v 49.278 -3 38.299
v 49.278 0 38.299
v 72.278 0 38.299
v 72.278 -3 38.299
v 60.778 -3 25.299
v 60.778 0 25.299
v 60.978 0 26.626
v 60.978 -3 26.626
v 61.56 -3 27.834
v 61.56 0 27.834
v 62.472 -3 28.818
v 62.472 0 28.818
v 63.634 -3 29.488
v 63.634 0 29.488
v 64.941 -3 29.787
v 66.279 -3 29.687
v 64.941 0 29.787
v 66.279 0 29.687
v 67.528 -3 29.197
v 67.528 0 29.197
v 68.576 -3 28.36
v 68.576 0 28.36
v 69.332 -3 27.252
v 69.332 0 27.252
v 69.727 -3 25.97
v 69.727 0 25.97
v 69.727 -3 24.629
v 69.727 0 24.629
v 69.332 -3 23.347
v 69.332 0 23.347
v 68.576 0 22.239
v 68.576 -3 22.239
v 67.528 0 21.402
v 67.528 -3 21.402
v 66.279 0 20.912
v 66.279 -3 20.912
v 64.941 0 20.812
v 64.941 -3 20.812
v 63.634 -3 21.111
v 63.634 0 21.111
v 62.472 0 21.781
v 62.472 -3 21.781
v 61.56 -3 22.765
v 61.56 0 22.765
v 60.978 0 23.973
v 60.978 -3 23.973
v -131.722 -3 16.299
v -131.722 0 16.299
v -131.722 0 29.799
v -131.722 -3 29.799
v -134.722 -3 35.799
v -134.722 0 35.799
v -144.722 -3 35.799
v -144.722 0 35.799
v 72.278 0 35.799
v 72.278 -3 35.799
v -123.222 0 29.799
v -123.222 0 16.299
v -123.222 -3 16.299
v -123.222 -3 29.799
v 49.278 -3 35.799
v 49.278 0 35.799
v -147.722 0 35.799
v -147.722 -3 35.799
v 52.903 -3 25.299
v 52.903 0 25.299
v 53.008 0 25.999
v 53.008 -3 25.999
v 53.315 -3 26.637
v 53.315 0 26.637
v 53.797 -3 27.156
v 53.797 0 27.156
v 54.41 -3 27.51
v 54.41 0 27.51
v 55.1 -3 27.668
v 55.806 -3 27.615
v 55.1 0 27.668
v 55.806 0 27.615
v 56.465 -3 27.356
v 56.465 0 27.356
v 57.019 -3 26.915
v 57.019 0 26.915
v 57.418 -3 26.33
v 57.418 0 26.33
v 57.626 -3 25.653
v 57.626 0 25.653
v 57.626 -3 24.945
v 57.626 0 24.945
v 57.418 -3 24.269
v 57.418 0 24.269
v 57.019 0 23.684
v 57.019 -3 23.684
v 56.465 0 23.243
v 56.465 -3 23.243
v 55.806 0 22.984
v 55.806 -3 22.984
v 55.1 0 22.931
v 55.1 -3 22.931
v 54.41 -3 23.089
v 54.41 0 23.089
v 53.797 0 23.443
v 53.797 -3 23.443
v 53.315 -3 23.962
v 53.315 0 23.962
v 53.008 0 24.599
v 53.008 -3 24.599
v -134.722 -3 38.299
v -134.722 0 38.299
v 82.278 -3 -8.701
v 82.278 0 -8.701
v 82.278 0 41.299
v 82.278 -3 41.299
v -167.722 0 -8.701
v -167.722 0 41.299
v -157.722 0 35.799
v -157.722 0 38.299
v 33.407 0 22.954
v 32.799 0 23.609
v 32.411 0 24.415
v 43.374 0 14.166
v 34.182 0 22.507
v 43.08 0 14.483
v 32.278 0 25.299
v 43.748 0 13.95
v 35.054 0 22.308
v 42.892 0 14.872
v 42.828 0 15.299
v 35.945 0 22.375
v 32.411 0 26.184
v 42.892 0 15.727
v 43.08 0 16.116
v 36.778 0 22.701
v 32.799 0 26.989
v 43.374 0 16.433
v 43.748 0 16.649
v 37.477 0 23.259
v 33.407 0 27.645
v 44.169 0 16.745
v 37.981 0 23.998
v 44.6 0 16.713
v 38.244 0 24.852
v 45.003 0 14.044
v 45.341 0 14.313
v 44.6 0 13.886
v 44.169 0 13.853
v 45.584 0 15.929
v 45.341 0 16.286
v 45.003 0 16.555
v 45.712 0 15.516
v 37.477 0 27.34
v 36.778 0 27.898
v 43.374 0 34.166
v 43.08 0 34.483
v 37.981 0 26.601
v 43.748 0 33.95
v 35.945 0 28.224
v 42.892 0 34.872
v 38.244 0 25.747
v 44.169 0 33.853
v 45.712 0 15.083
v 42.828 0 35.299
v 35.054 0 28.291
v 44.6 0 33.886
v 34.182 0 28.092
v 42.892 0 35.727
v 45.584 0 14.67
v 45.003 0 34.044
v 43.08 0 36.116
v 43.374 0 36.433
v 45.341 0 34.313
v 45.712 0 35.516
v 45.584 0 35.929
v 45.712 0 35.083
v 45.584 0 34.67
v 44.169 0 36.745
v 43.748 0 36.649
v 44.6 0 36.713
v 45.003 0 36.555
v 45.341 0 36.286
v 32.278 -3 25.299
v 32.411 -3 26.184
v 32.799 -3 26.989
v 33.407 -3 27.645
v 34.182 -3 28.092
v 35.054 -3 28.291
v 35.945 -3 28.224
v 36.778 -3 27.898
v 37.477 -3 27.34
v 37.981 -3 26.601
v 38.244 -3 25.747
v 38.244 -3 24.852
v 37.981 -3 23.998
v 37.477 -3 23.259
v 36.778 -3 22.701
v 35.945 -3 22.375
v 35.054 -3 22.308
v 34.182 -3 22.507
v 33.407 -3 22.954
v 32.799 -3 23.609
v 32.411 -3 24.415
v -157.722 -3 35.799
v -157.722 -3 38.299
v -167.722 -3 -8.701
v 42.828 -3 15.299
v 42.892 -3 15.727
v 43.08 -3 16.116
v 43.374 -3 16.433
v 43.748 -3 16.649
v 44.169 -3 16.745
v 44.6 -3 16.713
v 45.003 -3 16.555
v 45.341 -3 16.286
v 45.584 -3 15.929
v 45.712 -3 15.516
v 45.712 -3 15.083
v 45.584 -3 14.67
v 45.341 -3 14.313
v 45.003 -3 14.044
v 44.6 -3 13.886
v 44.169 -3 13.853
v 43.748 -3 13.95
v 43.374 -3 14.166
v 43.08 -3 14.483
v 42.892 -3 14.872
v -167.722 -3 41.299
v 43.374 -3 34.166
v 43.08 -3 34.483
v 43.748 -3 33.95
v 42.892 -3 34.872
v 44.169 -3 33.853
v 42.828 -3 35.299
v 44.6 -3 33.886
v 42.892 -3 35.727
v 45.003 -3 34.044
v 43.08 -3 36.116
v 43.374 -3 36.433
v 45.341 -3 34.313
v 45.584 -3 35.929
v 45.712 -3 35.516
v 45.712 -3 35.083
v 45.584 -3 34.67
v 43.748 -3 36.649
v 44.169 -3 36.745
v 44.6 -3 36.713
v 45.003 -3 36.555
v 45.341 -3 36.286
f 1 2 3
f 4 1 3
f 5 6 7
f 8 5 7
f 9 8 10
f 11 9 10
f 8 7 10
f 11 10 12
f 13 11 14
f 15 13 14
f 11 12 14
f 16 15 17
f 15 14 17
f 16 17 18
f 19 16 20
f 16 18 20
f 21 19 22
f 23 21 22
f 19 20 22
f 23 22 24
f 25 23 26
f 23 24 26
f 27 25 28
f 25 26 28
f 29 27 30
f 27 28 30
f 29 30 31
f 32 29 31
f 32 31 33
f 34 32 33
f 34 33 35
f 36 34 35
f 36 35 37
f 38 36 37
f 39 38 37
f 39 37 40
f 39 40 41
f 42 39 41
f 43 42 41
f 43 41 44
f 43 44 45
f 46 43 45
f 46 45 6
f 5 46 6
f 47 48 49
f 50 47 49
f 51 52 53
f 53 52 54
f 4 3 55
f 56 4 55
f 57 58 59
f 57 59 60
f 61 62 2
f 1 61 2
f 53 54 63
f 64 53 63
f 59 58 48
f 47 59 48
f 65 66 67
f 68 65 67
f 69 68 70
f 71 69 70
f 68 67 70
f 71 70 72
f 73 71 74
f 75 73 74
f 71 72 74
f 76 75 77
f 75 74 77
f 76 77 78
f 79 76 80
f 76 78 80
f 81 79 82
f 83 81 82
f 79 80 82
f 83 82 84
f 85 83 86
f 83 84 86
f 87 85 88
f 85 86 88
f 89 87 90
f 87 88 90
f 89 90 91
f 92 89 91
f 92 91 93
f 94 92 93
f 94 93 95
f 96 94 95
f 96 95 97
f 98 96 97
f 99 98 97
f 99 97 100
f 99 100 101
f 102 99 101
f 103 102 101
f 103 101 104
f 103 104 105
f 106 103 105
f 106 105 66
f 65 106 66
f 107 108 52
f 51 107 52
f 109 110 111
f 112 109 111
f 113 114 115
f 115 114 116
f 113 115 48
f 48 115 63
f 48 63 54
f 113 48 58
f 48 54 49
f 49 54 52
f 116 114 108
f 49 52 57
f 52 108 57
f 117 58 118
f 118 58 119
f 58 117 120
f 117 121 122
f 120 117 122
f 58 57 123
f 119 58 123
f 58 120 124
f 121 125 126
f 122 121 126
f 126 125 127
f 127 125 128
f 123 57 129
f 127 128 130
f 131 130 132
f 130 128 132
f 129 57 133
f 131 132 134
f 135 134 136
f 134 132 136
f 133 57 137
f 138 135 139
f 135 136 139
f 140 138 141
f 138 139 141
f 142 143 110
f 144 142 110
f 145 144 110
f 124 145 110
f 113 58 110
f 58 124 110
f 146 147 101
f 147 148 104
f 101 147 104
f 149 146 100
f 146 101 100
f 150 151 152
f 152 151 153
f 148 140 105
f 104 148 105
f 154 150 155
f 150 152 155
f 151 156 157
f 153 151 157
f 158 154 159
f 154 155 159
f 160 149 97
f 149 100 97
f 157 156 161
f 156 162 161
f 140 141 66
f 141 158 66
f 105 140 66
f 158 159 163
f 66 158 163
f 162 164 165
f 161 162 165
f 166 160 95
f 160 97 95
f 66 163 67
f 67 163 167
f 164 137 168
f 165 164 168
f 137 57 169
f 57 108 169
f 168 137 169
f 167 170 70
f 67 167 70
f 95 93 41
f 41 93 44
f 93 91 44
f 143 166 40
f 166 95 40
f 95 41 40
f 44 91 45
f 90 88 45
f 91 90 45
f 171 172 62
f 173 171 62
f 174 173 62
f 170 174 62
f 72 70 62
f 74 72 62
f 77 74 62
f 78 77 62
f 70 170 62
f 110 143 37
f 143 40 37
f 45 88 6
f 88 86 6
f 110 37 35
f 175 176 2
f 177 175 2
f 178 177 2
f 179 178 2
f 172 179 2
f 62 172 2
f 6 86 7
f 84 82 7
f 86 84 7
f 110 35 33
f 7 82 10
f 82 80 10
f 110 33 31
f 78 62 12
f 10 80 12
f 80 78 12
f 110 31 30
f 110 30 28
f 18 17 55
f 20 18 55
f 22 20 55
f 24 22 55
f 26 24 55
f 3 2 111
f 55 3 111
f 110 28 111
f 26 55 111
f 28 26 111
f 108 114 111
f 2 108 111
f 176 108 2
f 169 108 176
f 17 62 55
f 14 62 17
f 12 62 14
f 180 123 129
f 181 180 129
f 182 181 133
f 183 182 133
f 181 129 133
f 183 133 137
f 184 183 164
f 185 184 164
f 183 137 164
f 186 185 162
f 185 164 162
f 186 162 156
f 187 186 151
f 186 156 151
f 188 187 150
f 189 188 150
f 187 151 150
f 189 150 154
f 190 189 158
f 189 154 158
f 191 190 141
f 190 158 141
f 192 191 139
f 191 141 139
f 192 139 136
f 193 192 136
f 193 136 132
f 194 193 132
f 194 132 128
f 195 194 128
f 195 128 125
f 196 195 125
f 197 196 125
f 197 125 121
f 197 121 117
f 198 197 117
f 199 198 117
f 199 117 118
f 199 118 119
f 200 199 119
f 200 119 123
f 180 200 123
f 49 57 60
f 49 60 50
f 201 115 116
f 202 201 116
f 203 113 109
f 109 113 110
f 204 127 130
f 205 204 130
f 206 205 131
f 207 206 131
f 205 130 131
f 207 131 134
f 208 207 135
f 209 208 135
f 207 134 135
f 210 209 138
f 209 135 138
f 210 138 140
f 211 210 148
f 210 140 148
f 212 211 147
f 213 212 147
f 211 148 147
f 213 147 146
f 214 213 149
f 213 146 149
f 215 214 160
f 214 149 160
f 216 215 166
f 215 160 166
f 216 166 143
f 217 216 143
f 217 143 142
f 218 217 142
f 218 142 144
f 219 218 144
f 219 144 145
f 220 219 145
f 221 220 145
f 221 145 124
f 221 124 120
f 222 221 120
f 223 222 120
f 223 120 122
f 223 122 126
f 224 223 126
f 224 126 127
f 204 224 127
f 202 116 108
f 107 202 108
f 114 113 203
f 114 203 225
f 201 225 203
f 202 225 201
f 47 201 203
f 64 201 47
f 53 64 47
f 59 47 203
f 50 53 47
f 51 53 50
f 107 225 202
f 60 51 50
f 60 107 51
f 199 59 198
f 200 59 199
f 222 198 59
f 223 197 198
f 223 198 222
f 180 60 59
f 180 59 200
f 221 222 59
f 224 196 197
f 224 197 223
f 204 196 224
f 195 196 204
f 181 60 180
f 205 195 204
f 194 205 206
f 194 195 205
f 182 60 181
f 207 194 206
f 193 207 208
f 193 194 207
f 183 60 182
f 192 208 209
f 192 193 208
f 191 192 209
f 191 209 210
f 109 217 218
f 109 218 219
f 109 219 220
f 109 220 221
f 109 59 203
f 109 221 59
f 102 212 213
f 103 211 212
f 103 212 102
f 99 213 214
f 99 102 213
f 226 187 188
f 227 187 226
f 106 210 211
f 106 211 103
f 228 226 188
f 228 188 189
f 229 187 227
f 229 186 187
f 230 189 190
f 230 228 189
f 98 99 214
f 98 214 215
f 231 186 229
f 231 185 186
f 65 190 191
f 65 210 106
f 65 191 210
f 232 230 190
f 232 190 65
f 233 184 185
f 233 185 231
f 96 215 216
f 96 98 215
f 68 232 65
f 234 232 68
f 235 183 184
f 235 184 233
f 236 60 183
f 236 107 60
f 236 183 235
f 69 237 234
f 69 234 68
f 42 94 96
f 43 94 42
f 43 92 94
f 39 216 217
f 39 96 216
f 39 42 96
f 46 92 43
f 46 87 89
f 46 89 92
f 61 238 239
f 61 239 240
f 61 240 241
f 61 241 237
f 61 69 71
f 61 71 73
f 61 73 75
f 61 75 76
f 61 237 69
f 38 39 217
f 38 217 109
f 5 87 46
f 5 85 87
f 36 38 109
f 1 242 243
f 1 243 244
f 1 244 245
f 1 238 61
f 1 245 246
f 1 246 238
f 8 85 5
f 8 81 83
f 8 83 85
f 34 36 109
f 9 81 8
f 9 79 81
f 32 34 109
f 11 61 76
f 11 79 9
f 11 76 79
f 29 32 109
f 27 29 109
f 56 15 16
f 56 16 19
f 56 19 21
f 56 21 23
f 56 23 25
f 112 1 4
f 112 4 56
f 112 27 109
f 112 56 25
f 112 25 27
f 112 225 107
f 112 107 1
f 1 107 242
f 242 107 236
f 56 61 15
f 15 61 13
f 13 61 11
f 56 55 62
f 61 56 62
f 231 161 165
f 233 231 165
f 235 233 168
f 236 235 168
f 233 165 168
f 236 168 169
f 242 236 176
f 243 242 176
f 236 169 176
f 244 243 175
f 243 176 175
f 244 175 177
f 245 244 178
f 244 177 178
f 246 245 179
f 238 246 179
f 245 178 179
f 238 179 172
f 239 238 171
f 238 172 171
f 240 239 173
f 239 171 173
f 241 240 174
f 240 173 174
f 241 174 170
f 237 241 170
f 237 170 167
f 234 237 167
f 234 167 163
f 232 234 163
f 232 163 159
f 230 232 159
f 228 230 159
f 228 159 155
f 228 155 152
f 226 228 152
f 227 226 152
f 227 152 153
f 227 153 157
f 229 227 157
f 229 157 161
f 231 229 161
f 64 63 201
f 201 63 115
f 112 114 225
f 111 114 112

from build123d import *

# Parameters (mm, degrees)
F0_W     = 250
F0_H     = 50
F1_DEPTH = 3
F2_DEPTH = 3
F3_R     = 4.5
F3_R_2   = 1.45
F3_R_3   = 2.375
F3_R_4   = 3
F3_W     = 8.5
F3_H     = 13.5
F4_DEPTH = 25


# Not quite as in the source:
# - ends of sketch curves that miss each other by under 0.0002 mm in the source are joined


with BuildPart() as f1:
    # F0 (on Front) → F1 (new body)
    with BuildSketch(Plane.XZ):
        with Locations((-42.7222467884, 16.2994446903)):
            Rectangle(F0_W, F0_H)
        Polygon((-147.7222467884, 35.7994452119), (-157.7222467884, 35.7994452119), (-157.7222467884, 38.2994446903), (-134.7222467884, 38.2994446903), (-134.7222467884, 35.7994446903), (-144.7222467884, 35.7994446903), align=None, mode=Mode.SUBTRACT)
        Polygon((49.2777532116, 38.2994446903), (62.2777532116, 38.2994446903), (72.2777532116, 38.2994446903), (72.2777532116, 35.7994446903), (49.2777532116, 35.7994446903), align=None, mode=Mode.SUBTRACT)
    extrude(amount=F1_DEPTH)

    # F0 (on Front) → F2 (join)
    with BuildSketch(Plane.XZ):
        with Locations((-42.7222467884, 16.2994446903)):
            Rectangle(F0_W, F0_H)
        Polygon((-147.7222467884, 35.7994452119), (-157.7222467884, 35.7994452119), (-157.7222467884, 38.2994446903), (-134.7222467884, 38.2994446903), (-134.7222467884, 35.7994446903), (-144.7222467884, 35.7994446903), align=None, mode=Mode.SUBTRACT)
        Polygon((49.2777532116, 38.2994446903), (62.2777532116, 38.2994446903), (72.2777532116, 38.2994446903), (72.2777532116, 35.7994446903), (49.2777532116, 35.7994446903), align=None, mode=Mode.SUBTRACT)
    extrude(amount=F2_DEPTH)

    # F3 (on face) → F4 (cut)
    with BuildSketch(Plane(origin=(0, 0, 0), x_dir=(-1, 0, 0), z_dir=(0, 1, 0))):
        with Locations((-65.2777532116, 25.2994446903)):
            Circle(F3_R)
        with Locations((-44.2777532116, 15.2994446903)):
            Circle(F3_R_2)
        with Locations((-44.2777532116, 35.2994446903)):
            Circle(F3_R_2)
        with Locations((-55.2777532116, 25.2994446903)):
            Circle(F3_R_3)
        with Locations((-35.2777532116, 25.2994446903)):
            Circle(F3_R_4)
        with Locations((127.4722467884, 23.0494446903)):
            Rectangle(F3_W, F3_H)
    extrude(amount=-F4_DEPTH, mode=Mode.SUBTRACT)


solid = f1.part
